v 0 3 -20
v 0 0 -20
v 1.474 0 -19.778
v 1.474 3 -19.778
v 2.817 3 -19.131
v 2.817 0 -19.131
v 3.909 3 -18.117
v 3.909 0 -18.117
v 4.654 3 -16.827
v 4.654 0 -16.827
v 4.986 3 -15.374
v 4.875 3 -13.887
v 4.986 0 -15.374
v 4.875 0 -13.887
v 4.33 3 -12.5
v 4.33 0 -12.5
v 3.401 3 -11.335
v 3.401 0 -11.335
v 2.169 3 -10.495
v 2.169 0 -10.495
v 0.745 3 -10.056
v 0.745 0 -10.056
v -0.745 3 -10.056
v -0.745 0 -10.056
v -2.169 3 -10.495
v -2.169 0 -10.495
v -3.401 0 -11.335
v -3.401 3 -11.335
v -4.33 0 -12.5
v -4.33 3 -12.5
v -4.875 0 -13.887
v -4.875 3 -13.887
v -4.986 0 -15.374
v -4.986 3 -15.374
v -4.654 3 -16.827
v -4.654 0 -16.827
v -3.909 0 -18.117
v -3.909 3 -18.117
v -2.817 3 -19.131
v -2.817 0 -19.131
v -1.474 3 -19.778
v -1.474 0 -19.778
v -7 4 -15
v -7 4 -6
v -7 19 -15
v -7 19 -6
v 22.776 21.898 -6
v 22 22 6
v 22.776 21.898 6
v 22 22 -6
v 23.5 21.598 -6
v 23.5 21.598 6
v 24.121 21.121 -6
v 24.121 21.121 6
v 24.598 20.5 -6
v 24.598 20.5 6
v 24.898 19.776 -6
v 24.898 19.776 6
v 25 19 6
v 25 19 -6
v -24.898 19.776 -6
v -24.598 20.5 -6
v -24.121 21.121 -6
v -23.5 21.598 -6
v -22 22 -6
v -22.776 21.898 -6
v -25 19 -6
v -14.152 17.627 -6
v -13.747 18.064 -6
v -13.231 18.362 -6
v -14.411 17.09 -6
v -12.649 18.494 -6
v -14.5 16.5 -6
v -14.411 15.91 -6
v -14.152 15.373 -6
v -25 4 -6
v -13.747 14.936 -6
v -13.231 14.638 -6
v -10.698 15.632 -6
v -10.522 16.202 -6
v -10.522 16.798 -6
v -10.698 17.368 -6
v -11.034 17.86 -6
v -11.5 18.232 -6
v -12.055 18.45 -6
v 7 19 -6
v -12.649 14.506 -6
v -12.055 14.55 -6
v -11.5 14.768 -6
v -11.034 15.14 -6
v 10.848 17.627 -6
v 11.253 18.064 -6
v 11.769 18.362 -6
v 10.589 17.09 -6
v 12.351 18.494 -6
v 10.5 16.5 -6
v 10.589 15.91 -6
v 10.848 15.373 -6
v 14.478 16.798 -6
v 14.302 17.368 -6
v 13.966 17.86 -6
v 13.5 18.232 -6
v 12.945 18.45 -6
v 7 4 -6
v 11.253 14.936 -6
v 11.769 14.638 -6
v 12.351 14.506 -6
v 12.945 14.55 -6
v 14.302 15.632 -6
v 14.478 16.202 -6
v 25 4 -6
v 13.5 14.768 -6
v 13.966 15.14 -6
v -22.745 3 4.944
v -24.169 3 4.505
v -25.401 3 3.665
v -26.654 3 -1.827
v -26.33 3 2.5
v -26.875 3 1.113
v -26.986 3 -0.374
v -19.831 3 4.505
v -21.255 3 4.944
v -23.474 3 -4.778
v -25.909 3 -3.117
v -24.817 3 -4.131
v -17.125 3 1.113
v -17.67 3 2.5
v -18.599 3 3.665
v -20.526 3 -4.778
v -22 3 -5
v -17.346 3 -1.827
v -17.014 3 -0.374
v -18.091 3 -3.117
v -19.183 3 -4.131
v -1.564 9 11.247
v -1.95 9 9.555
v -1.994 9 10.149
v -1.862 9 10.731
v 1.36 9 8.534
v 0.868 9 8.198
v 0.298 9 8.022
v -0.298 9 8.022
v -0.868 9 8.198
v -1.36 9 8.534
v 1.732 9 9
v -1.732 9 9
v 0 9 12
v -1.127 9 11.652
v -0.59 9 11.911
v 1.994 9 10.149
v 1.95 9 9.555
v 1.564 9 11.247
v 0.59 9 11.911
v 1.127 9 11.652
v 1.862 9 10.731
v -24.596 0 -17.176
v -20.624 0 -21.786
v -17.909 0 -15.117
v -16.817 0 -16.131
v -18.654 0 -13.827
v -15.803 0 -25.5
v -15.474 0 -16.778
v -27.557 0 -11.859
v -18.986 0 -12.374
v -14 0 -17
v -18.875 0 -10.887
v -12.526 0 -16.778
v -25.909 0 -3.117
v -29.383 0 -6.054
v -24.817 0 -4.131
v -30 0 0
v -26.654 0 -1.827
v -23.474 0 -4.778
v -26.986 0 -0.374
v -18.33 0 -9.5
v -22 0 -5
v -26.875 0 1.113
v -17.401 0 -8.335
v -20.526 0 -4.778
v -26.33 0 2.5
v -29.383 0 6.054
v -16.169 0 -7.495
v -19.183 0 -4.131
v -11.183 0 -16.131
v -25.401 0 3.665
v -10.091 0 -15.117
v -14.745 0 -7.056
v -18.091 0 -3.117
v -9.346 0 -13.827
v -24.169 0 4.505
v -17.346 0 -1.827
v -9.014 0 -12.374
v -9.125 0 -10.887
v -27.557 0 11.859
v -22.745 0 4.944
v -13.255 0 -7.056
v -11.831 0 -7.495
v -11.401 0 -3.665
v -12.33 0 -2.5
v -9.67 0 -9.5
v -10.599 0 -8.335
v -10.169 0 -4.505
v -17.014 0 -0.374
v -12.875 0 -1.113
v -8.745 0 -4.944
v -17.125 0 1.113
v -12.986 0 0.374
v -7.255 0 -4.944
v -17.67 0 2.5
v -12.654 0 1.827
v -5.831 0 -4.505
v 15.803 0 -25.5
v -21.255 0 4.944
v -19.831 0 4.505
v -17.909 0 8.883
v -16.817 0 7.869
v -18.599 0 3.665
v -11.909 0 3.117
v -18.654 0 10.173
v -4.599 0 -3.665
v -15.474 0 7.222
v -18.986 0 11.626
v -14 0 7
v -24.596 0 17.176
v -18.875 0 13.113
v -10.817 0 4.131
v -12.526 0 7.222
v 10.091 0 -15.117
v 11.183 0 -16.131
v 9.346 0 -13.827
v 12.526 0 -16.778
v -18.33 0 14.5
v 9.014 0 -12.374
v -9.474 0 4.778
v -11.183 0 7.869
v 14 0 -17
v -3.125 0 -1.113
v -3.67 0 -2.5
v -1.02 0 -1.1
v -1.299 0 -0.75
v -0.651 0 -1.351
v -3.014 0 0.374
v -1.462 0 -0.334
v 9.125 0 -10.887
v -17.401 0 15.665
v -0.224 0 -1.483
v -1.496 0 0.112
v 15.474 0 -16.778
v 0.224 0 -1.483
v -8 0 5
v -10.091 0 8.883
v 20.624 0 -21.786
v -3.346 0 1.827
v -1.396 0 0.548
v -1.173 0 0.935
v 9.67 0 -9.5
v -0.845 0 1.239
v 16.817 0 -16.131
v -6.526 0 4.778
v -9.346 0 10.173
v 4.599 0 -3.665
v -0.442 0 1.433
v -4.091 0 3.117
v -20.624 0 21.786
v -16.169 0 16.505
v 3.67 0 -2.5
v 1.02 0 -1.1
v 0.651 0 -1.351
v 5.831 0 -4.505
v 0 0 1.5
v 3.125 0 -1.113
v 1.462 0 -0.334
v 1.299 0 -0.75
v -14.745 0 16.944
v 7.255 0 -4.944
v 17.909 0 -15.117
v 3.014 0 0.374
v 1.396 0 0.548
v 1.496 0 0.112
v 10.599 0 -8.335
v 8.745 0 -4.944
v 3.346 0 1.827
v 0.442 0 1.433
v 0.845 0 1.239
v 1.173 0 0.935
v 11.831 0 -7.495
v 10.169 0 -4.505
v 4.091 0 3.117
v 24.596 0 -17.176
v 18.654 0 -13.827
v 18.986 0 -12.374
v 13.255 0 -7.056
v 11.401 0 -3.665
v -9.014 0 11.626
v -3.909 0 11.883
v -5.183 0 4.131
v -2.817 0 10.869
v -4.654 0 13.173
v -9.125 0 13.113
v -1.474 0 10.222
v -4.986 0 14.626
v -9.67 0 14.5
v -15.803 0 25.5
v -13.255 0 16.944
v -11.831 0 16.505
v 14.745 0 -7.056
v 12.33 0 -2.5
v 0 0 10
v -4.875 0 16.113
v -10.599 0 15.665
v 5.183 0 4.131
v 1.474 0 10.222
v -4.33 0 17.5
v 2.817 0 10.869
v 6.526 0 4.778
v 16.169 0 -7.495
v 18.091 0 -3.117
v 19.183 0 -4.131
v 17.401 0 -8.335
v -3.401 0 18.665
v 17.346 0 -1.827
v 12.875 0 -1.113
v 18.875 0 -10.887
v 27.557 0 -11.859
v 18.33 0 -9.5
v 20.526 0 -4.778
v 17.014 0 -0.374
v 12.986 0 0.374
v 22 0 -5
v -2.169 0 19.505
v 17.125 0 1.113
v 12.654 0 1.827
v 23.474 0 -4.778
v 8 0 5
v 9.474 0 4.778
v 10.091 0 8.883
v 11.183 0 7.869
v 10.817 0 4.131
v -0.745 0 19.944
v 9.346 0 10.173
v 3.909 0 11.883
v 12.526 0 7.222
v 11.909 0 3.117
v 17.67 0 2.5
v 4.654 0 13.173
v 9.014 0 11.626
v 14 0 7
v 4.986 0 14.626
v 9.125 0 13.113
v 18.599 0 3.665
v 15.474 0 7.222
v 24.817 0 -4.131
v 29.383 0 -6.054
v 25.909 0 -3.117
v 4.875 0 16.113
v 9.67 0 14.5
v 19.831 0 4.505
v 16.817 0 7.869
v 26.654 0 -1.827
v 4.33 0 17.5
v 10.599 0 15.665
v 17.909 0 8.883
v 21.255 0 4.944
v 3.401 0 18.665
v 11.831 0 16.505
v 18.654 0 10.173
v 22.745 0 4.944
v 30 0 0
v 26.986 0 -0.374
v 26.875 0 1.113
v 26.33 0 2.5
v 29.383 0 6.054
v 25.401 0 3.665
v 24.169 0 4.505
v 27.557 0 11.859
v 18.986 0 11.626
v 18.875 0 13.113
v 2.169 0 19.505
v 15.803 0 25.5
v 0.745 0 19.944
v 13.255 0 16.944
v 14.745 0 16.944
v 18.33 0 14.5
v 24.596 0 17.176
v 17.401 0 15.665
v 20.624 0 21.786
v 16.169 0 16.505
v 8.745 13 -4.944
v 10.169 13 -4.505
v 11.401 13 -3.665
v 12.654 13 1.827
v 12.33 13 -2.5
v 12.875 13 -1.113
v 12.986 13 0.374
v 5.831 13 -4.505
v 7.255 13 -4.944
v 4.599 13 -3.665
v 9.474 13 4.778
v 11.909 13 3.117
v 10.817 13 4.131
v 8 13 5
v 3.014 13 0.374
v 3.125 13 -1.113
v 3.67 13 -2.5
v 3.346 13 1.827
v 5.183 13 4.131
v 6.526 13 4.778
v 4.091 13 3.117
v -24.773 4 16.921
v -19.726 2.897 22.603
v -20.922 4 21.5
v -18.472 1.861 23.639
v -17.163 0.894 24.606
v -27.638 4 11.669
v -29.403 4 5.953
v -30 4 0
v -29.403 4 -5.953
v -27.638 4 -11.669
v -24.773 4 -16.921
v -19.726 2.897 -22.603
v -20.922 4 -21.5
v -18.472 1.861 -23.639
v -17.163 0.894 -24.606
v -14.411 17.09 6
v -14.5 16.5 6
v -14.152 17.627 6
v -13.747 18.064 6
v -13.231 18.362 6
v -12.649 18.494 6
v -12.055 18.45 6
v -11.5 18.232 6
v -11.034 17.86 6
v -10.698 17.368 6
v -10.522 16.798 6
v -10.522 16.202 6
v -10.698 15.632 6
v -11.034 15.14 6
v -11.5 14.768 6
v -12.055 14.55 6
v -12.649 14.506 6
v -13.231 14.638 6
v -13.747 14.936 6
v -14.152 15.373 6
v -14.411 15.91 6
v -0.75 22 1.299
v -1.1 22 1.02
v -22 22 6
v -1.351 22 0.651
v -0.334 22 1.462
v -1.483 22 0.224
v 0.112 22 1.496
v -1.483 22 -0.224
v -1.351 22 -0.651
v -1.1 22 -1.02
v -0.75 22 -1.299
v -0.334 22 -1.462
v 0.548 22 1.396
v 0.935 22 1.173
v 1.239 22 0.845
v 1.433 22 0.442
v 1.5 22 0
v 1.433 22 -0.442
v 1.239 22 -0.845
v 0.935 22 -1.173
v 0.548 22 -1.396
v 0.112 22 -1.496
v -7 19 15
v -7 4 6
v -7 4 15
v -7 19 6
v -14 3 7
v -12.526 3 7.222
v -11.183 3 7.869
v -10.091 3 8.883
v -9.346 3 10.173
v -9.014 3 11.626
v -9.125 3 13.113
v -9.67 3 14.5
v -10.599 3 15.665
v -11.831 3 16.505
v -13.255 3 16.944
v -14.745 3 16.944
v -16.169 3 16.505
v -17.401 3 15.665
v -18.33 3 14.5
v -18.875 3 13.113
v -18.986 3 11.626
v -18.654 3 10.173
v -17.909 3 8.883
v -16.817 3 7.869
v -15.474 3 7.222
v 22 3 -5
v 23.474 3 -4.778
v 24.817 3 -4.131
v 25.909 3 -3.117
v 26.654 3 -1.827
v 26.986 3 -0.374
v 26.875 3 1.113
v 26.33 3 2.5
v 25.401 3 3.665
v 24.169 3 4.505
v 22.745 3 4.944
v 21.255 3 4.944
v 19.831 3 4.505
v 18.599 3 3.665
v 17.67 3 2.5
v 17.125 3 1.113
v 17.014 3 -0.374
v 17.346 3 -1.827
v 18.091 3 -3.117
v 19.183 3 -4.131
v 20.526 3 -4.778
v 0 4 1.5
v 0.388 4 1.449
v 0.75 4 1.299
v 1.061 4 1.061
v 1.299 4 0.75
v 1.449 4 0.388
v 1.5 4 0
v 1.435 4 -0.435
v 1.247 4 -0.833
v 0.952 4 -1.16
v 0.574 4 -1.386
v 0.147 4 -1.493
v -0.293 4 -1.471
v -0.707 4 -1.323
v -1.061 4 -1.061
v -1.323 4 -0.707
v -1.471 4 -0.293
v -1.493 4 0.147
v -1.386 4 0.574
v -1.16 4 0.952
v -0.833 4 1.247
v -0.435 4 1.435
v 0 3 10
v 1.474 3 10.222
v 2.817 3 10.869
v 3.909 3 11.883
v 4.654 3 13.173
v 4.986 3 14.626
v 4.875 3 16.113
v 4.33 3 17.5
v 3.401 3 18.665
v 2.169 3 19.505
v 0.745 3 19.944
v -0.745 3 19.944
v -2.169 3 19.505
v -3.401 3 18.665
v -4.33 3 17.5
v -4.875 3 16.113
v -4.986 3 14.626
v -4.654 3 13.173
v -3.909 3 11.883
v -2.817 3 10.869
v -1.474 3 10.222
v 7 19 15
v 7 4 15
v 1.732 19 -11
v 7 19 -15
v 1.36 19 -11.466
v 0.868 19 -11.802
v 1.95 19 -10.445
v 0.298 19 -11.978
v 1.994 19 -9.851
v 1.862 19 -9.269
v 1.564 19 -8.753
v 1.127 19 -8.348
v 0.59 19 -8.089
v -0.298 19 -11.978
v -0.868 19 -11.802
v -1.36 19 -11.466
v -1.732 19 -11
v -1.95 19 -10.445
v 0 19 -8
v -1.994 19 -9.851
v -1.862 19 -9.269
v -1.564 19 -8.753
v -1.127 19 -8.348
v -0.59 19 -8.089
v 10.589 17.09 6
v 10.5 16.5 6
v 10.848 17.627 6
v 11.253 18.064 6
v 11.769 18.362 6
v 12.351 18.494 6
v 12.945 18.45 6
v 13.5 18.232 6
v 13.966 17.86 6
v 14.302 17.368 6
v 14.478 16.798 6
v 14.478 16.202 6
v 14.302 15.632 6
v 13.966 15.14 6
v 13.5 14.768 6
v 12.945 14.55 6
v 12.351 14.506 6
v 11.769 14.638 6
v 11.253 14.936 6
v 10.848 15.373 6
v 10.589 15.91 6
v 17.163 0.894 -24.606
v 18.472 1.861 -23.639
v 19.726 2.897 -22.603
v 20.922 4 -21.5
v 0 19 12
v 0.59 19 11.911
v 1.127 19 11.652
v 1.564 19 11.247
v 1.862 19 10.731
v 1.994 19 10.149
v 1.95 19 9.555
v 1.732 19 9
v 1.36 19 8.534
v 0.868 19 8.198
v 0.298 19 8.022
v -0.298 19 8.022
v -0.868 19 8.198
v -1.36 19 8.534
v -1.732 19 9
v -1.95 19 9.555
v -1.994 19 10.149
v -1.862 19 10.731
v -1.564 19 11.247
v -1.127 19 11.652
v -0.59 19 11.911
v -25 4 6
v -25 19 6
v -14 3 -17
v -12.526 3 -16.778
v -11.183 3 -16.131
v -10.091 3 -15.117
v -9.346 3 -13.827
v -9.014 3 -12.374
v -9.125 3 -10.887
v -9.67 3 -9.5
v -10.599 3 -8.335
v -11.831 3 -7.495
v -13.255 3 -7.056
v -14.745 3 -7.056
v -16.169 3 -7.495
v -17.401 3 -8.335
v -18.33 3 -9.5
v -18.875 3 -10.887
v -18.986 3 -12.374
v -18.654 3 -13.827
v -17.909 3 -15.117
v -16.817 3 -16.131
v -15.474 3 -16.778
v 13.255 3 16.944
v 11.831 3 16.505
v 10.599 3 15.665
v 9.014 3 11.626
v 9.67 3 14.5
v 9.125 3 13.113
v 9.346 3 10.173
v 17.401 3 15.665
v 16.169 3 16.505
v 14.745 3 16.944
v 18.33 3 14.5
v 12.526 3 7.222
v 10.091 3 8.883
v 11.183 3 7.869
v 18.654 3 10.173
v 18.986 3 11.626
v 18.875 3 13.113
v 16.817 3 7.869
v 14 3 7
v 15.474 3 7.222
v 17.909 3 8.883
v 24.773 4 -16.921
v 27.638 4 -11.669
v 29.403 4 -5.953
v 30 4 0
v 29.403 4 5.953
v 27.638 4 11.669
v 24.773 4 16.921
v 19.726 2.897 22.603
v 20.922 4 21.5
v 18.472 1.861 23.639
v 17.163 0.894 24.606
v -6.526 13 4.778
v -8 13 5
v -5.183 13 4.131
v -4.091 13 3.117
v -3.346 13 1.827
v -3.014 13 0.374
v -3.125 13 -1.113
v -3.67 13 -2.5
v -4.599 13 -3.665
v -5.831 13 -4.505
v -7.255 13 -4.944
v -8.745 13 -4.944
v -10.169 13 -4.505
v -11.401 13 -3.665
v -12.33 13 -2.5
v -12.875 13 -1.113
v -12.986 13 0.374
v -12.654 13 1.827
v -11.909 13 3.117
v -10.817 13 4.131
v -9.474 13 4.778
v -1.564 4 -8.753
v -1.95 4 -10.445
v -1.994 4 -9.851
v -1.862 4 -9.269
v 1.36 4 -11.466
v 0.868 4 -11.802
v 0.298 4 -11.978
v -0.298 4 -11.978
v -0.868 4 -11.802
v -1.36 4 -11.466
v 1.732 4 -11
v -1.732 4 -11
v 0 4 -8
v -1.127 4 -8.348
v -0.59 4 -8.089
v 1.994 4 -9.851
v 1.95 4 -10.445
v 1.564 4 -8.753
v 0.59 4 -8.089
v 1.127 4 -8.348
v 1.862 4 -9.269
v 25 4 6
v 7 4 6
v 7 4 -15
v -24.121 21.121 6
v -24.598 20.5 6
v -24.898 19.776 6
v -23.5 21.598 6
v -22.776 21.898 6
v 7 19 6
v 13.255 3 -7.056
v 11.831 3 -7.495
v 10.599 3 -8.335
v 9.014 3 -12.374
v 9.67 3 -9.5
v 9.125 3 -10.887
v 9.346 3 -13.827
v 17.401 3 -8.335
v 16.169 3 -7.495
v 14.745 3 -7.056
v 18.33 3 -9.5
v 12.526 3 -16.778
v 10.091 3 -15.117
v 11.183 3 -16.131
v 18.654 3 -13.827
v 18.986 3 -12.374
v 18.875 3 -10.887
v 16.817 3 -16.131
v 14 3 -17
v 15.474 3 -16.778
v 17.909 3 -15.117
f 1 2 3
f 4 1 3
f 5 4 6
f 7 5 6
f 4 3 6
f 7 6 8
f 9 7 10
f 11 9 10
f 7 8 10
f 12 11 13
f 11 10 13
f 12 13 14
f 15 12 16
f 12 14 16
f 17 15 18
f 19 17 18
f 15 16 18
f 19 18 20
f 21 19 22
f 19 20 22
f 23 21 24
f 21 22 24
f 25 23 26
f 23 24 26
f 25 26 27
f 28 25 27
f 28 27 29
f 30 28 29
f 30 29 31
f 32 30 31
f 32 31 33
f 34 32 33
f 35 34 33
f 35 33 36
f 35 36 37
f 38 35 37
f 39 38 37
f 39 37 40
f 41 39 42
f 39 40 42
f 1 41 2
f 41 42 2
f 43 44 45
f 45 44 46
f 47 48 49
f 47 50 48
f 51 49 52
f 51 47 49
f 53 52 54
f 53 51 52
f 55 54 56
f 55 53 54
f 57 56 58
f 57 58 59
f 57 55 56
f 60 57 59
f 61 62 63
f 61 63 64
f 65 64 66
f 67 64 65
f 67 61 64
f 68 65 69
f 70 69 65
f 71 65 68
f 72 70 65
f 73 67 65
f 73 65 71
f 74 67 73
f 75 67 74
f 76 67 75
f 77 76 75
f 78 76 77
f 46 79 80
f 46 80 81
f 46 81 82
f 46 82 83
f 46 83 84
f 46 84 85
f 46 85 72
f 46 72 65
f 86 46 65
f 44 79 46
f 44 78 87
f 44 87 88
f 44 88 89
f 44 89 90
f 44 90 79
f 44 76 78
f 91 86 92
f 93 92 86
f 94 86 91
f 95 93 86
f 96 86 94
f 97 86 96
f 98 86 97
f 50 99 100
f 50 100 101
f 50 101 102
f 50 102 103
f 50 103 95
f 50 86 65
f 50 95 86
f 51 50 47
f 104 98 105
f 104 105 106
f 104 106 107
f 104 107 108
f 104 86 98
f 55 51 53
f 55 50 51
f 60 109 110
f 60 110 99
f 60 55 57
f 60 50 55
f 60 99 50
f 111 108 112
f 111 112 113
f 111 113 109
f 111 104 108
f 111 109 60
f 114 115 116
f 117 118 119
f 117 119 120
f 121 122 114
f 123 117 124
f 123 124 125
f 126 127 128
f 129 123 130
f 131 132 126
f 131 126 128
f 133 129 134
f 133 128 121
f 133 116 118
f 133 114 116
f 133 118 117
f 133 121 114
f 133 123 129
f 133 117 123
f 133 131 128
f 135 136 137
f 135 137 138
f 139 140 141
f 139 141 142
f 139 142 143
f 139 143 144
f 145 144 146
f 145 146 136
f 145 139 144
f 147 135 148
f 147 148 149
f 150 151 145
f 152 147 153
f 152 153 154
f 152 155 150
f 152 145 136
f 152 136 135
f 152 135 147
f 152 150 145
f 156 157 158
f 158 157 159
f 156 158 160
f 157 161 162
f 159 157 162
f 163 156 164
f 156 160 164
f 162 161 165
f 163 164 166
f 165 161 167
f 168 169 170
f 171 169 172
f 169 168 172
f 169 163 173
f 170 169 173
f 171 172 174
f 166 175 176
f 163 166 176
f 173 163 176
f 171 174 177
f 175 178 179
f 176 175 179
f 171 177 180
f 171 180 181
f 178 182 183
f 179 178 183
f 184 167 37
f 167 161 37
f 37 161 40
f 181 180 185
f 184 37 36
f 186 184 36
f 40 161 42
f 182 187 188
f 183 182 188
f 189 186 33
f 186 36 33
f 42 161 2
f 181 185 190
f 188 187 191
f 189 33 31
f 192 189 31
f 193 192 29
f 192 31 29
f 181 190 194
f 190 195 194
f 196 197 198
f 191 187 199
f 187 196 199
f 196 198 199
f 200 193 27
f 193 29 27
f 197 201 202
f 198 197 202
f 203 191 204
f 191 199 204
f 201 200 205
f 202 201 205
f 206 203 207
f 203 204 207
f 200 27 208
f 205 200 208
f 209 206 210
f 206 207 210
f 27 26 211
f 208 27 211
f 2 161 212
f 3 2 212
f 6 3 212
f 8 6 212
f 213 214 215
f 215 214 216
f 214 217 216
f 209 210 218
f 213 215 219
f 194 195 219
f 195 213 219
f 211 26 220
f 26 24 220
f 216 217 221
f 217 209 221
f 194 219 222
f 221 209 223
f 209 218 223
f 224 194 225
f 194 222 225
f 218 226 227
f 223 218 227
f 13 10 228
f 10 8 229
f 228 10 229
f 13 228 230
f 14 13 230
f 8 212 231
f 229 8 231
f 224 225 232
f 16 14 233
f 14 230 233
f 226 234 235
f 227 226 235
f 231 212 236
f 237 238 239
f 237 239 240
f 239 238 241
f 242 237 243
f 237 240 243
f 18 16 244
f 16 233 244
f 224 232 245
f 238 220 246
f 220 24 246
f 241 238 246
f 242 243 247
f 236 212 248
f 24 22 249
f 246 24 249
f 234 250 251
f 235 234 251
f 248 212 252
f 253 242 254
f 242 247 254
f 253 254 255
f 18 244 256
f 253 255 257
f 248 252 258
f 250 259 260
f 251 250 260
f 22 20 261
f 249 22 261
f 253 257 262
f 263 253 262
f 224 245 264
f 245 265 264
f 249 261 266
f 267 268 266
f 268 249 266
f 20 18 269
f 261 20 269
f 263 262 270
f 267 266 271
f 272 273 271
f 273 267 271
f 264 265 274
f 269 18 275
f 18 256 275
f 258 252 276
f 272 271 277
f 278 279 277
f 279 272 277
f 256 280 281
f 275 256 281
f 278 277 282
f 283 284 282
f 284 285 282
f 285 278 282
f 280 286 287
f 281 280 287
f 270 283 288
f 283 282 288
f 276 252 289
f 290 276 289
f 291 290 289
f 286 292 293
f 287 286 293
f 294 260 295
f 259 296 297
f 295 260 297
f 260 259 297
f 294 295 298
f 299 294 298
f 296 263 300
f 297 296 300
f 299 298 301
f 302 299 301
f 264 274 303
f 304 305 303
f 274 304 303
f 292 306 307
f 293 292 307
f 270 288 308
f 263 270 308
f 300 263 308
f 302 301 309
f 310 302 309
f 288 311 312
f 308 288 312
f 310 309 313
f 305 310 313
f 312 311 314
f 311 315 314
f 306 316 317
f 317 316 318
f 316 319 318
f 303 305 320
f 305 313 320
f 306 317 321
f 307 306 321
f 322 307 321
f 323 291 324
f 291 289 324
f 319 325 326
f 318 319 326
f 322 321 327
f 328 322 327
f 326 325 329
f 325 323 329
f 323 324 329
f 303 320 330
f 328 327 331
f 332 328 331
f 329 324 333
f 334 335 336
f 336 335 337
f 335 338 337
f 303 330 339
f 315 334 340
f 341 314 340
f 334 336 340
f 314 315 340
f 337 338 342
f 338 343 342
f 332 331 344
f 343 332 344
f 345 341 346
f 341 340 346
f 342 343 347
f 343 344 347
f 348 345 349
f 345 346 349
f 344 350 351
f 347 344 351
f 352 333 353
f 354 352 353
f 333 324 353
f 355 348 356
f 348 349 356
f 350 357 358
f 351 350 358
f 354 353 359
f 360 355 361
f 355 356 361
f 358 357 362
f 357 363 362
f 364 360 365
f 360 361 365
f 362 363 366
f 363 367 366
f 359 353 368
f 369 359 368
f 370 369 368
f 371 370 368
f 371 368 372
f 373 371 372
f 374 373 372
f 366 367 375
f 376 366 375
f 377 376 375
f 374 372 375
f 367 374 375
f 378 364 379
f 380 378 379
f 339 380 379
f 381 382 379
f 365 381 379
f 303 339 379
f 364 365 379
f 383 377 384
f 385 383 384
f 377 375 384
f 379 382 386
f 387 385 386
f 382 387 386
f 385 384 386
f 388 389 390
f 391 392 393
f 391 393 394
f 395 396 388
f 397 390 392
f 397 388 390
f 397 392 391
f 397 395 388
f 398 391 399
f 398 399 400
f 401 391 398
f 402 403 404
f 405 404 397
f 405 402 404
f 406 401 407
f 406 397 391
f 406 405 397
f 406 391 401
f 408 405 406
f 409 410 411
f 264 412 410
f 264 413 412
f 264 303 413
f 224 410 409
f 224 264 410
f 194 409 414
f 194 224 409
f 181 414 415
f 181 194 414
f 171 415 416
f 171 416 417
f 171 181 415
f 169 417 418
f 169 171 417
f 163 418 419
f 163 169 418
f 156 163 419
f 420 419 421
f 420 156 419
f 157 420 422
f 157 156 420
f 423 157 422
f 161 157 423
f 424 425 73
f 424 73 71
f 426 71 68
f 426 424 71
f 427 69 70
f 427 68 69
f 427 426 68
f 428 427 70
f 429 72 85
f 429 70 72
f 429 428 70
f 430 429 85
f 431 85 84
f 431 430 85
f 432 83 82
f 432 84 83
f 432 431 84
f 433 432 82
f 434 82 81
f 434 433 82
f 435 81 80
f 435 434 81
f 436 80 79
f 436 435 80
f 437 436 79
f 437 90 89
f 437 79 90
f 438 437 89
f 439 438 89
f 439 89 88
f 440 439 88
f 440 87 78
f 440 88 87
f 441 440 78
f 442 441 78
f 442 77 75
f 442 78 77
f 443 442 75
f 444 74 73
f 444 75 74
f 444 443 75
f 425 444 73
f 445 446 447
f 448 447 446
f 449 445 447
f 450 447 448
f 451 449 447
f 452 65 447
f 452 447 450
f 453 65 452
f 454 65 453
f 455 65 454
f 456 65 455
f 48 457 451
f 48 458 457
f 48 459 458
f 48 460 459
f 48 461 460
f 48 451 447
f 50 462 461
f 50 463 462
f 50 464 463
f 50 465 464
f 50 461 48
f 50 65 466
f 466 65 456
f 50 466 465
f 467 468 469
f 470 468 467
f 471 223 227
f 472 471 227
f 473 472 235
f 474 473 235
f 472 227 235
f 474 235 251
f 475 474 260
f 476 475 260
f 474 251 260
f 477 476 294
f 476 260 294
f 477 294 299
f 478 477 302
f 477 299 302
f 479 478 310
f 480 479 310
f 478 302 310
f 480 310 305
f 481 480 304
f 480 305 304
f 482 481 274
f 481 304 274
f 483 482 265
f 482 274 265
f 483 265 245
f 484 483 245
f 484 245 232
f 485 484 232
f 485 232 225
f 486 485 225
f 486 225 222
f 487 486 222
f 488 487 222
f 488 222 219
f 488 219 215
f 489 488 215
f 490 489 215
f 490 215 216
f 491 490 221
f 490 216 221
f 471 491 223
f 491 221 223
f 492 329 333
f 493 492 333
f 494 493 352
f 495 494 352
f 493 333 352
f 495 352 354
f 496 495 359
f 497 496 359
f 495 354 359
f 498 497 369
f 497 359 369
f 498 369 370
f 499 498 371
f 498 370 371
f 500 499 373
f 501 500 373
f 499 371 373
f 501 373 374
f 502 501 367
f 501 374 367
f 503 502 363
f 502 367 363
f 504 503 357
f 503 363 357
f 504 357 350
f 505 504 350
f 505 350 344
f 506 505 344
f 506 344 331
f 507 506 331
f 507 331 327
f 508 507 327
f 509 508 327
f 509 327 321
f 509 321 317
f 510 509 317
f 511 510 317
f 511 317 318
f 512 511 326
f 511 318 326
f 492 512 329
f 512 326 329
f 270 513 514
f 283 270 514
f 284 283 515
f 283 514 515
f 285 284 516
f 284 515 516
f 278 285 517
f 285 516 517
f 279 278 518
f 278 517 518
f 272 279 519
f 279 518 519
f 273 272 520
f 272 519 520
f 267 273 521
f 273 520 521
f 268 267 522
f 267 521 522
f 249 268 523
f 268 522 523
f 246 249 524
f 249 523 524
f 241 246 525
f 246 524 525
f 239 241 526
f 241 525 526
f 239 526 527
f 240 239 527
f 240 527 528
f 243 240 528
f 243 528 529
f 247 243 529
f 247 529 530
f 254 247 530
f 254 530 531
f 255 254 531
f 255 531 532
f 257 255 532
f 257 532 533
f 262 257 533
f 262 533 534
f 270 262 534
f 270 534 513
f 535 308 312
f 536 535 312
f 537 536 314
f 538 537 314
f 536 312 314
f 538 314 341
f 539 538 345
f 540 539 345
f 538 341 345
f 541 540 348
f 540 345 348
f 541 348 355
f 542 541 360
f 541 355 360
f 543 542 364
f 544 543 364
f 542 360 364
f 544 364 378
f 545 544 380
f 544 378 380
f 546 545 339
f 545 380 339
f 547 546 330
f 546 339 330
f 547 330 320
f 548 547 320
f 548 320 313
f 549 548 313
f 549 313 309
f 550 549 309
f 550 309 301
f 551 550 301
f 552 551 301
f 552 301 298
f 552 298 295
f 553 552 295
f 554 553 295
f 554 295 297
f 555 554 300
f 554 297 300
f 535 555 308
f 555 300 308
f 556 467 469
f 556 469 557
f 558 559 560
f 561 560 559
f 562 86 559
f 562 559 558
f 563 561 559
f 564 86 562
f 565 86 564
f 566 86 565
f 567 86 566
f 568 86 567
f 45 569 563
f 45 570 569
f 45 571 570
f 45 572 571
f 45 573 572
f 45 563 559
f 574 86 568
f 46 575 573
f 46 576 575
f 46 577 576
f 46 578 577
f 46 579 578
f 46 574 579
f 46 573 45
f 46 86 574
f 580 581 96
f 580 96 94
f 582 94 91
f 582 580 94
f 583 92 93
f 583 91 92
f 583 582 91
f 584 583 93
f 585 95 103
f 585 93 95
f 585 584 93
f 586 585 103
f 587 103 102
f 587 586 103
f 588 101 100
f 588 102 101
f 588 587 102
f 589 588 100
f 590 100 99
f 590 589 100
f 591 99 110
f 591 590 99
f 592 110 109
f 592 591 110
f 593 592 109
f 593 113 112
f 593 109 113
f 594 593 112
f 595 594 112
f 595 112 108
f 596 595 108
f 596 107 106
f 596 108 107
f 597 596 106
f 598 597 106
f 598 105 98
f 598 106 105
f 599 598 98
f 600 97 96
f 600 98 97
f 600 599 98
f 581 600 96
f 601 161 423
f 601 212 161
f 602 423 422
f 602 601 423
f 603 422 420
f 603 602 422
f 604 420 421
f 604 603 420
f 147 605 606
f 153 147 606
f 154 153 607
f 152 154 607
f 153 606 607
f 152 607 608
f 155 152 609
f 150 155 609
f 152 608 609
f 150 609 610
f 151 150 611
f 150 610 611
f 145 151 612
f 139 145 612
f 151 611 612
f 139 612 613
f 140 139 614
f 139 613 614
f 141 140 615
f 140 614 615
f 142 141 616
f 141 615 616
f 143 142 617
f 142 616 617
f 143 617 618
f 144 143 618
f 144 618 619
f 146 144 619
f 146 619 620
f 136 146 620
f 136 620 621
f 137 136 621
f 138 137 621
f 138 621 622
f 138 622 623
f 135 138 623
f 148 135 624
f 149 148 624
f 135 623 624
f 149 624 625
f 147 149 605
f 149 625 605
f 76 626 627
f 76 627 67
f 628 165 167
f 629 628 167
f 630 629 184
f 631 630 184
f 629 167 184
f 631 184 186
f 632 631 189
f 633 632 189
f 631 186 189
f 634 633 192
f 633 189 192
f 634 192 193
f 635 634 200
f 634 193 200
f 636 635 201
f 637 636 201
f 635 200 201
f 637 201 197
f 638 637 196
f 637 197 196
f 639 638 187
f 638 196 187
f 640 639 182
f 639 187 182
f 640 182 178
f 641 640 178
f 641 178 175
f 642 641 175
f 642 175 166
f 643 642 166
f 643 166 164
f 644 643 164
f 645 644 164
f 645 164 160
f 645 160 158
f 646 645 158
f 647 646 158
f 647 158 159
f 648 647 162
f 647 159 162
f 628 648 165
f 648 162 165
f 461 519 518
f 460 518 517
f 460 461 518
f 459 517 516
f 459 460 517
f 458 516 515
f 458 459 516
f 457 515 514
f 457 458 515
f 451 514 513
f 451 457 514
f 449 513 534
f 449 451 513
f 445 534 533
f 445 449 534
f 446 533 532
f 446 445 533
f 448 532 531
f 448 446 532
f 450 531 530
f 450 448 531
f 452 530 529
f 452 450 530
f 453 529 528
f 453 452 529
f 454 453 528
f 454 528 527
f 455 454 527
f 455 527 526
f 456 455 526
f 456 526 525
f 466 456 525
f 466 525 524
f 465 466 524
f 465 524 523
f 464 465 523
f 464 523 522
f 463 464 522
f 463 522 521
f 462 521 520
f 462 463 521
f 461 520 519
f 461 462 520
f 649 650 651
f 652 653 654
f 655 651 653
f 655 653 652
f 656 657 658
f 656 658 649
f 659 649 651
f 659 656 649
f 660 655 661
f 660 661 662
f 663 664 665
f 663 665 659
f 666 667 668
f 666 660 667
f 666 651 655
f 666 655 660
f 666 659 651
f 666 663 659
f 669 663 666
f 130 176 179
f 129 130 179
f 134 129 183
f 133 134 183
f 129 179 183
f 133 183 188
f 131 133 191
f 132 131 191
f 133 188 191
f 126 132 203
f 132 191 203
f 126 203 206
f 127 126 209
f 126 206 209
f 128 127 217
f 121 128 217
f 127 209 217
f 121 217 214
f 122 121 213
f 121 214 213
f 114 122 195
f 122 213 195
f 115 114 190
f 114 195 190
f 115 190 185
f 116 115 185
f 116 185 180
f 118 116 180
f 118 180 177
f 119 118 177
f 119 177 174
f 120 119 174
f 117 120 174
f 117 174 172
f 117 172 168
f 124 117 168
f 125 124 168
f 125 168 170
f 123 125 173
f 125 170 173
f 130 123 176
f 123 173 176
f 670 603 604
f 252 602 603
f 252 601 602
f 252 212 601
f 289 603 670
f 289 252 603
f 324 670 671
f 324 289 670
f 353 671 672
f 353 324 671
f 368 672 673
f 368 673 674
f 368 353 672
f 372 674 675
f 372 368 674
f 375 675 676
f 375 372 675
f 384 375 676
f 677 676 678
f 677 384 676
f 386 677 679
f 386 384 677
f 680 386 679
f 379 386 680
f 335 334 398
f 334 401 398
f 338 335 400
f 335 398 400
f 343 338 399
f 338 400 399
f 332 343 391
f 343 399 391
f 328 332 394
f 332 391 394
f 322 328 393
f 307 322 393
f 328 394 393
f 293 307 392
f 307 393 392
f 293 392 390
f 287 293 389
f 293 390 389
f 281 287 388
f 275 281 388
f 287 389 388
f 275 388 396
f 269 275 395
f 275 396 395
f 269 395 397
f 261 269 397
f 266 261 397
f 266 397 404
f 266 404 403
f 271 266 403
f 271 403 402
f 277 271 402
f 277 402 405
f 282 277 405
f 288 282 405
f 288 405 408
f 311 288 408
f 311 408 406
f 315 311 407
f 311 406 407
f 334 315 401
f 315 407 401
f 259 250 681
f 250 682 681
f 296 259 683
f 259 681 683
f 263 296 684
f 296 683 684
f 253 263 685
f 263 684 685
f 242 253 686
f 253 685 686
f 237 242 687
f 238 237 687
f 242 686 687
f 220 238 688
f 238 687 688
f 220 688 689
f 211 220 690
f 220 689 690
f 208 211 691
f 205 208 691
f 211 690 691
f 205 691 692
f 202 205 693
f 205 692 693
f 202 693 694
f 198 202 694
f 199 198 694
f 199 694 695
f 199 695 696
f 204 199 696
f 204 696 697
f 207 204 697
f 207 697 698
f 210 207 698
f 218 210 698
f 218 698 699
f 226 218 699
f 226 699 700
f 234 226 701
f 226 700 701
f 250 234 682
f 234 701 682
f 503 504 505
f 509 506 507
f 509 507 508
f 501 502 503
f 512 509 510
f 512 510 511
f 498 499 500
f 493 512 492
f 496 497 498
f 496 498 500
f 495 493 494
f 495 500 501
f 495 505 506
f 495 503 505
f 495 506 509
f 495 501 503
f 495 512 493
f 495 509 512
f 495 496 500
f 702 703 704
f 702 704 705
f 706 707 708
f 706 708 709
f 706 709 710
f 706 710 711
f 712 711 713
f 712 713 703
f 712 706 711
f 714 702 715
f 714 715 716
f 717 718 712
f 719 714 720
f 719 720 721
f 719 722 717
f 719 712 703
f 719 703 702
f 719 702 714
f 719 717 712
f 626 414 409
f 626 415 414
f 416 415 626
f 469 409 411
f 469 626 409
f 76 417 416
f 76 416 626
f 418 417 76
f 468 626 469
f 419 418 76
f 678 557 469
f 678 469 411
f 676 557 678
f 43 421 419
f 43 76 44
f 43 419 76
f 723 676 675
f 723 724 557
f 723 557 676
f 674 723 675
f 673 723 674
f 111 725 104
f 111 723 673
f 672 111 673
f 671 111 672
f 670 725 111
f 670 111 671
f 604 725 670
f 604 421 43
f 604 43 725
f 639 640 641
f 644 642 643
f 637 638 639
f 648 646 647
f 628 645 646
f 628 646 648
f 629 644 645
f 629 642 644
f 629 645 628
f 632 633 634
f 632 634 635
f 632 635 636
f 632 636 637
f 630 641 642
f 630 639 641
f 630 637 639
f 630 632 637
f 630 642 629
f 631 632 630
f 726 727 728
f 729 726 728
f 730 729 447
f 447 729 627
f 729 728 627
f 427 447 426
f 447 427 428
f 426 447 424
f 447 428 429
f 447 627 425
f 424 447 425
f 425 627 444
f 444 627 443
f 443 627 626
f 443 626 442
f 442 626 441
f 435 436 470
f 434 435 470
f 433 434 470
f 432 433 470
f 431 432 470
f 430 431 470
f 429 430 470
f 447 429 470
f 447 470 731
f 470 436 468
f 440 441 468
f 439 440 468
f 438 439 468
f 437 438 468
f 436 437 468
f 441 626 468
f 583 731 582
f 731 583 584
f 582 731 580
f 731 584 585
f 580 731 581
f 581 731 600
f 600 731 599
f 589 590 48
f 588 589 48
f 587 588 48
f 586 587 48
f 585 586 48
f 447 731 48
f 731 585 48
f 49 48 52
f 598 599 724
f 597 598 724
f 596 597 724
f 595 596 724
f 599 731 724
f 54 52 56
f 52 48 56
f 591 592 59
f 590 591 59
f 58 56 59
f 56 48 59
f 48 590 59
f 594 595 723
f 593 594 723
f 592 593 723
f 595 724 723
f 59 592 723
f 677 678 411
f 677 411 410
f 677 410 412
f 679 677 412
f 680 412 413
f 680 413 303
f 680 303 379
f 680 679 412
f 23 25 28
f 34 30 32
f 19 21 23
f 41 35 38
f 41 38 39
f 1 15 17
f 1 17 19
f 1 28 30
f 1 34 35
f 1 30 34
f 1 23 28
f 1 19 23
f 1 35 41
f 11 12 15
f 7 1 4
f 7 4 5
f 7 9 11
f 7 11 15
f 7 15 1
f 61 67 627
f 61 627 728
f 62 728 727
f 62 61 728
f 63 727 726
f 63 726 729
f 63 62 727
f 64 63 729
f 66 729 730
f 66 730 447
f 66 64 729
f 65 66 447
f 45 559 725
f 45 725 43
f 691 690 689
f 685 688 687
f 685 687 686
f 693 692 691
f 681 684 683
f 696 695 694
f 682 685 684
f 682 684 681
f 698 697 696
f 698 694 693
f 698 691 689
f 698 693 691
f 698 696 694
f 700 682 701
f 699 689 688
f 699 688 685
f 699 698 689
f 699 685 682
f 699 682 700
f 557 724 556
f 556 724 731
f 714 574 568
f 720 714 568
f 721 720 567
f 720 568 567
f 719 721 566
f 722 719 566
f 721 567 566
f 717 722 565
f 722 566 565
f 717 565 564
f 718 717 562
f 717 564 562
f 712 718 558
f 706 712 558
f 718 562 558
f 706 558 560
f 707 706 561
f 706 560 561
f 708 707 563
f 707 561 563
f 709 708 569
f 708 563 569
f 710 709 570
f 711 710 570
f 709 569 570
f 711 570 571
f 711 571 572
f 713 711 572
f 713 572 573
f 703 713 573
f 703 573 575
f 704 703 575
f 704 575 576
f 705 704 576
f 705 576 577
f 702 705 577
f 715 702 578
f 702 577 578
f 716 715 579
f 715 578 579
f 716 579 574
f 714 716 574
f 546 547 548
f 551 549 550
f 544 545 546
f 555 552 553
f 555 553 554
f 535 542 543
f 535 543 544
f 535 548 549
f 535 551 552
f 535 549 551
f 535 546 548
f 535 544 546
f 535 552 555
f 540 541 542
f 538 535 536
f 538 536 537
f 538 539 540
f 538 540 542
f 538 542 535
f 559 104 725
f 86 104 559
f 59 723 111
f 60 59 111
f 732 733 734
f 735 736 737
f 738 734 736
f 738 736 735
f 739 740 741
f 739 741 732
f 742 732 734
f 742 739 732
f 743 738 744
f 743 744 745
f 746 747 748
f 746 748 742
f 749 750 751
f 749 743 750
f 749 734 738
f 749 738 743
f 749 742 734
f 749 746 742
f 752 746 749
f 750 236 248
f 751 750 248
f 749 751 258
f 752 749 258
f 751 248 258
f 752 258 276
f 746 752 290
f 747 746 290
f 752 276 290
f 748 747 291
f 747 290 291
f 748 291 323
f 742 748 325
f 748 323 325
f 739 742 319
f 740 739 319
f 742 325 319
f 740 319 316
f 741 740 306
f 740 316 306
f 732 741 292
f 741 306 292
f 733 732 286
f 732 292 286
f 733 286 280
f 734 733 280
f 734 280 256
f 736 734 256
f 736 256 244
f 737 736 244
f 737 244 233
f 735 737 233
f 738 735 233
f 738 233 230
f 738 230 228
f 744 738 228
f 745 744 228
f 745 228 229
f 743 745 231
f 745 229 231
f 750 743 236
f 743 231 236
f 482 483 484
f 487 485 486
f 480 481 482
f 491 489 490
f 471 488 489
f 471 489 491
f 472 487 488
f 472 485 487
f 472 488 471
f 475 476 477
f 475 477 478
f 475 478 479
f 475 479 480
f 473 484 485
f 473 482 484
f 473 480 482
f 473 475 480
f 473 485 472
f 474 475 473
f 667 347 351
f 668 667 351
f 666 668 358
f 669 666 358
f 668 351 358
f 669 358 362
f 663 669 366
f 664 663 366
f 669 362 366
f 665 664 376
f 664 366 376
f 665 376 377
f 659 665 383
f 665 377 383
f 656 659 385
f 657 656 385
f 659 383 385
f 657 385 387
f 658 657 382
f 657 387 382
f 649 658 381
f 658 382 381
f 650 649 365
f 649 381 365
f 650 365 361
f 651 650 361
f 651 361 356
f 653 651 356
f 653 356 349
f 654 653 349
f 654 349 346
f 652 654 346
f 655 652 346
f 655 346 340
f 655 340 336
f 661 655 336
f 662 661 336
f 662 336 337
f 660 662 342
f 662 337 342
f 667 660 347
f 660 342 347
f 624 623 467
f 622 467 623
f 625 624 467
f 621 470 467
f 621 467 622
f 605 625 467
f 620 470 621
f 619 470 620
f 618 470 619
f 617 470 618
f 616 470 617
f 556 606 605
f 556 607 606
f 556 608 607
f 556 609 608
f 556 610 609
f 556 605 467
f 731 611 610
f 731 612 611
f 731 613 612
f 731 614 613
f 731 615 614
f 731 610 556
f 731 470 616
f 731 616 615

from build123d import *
from build123d.topology import SkipClean

# Parameters (mm, degrees)
SKETCH1_R                            = 30
BOSS_EXTRUDE1_DEPTH                  = 4
BOSS_EXTRUDE2_REACH                  = 44.615
BOSS_EXTRUDE2_END_RADIUS             = 30
BOSS_EXTRUDE2_DIRECTION_2_REACH      = 44.615
BOSS_EXTRUDE2_DIRECTION_2_END_RADIUS = 30
SKETCH3_OUTSIDE_W                    = 78.092
SKETCH3_OUTSIDE_H                    = 69.092
SKETCH3_OUTSIDE_R                    = 21.5
CUT_EXTRUDE2_DEPTH                   = 12.5
BOSS_EXTRUDE3_DEPTH                  = 18
BOSS_EXTRUDE4_DEPTH                  = 15
BOSS_EXTRUDE5_DEPTH                  = 15
CUT_EXTRUDE3_DEPTH                   = 44.292609069
CUT_EXTRUDE3_DEPTH_BACK              = 44.292609069
SKETCH8_R                            = 2
CUT_EXTRUDE8_DEPTH                   = 48.077064479
CUT_EXTRUDE8_DEPTH_BACK              = 48.077064479
CUT_EXTRUDE9_DEPTH                   = 59.659818207
CUT_EXTRUDE11_DEPTH                  = 20
CUT_EXTRUDE12_DEPTH                  = 20
CUT_EXTRUDE13_DEPTH                  = 20
CUT_EXTRUDE14_DEPTH                  = 44.292609069
CUT_EXTRUDE14_DEPTH_BACK             = 44.292609069
SKETCH25_W                           = 66.075437062
SKETCH25_H                           = 20.142243048
SKETCH26_R                           = 5
CUT_EXTRUDE15_DEPTH                  = 24
SKETCH27_R                           = 1.5
CUT_EXTRUDE16_DEPTH                  = 30
SKETCH28_R                           = 5
CUT_EXTRUDE17_DEPTH                  = 3
CUT_EXTRUDE18_DEPTH                  = 43.690748412
CUT_EXTRUDE18_DEPTH_BACK             = 43.690748412
SKETCH29_W                           = 43.412566799
SKETCH29_H                           = 13.326200919
SKETCH32_W                           = 50
SKETCH32_H                           = 12
BOSS_EXTRUDE6_DEPTH                  = 18
SKETCH35_W                           = 14
SKETCH35_H                           = 15
BOSS_EXTRUDE7_DEPTH                  = 9
CUT_EXTRUDE19_DEPTH                  = 49.746794766
CUT_EXTRUDE19_DEPTH_BACK             = 49.746794766
SKETCH37_R                           = 2
SKETCH36_R                           = 2
CUT_EXTRUDE20_DEPTH                  = 15
SKETCH39_W                           = 14
SKETCH39_H                           = 15
BOSS_EXTRUDE8_DEPTH                  = 9
SKETCH40_R                           = 2
CUT_EXTRUDE21_DEPTH                  = 10
CUT_EXTRUDE22_START                  = -9
SKETCH41_R                           = 5
CUT_EXTRUDE22_DEPTH                  = 9
CUT_EXTRUDE23_START                  = -9
SKETCH42_R                           = 5
CUT_EXTRUDE23_DEPTH                  = 9
FILLET1_R                            = 3
CUT_EXTRUDE24_START                  = -19
CUT_EXTRUDE24_OUTLINE_R              = 1.5
CUT_EXTRUDE24_DEPTH                  = 19
CUT_EXTRUDE24_START_2                = -7
CUT_EXTRUDE24_2_DEPTH                = 14


with BuildPart() as part:
    # Sketch1 → Boss-Extrude1 (new body)
    with BuildSketch(Plane(origin=(0, 0, 0), x_dir=(1, 0, 0), z_dir=(0, 1, 0))):
        with Locations(Location((0, 0, 0), (0, 0, 270))):
            Circle(SKETCH1_R)
    extrude(amount=BOSS_EXTRUDE1_DEPTH)

    # Boss-Extrude2: up to this cylinder (the profile starts inside it)
    with SkipClean():  # the faces are left unmerged after this step: merging them gives an invalid solid
        boss_extrude2_end = Plane(origin=(0, 9.396175, 0), z_dir=(0, -1, 0)) * Cylinder(BOSS_EXTRUDE2_END_RADIUS, 150.23, mode=Mode.PRIVATE)
        # Sketch2 → Boss-Extrude2 (add, up to the surface)
        with BuildSketch(Plane(origin=(0, 0, 0), x_dir=(0, 0, -1), z_dir=(1, 0, 0)), mode=Mode.PRIVATE) as boss_extrude2_sk1:
            Polygon((0, 4), (21.5, 4), (9, 16.5), (-9, 16.5), (-21.5, 4), align=None)
        boss_extrude2_tool1 = extrude(boss_extrude2_sk1.sketch, amount=BOSS_EXTRUDE2_REACH, mode=Mode.PRIVATE) & boss_extrude2_end
        add(boss_extrude2_tool1.solids().sort_by_distance((0, 9.396175, 0))[0])

    # Boss-Extrude2 direction 2: up to this cylinder (the profile starts inside it)
    with SkipClean():  # the faces are left unmerged after this step: merging them gives an invalid solid
        boss_extrude2_direction_2_end = Plane(origin=(0, 9.396175, 0), z_dir=(0, -1, 0)) * Cylinder(BOSS_EXTRUDE2_DIRECTION_2_END_RADIUS, 150.23, mode=Mode.PRIVATE)
        # Sketch2 → Boss-Extrude2 direction 2 (add, up to the surface)
        with BuildSketch(Plane(origin=(0, 0, 0), x_dir=(0, 0, -1), z_dir=(1, 0, 0)), mode=Mode.PRIVATE) as boss_extrude2_direction_2_sk1:
            Polygon((0, 4), (21.5, 4), (9, 16.5), (-9, 16.5), (-21.5, 4), align=None)
        boss_extrude2_direction_2_tool1 = extrude(boss_extrude2_direction_2_sk1.sketch, amount=-BOSS_EXTRUDE2_DIRECTION_2_REACH, mode=Mode.PRIVATE) & boss_extrude2_direction_2_end
        add(boss_extrude2_direction_2_tool1.solids().sort_by_distance((0, 9.396175, 0))[0])

    # SurfaceCut1
    split(bisect_by=Plane(origin=(0, 12.75, -12.75), x_dir=(1, 0, 0), z_dir=(0, 0.7071067811865558, -0.7071067811865392)), keep=Keep.BOTTOM)

    # SurfaceCut2
    split(bisect_by=Plane(origin=(0, 12.75, 12.75), x_dir=(1, 0, 0), z_dir=(0, 0.7071067811865509, 0.7071067811865442)), keep=Keep.BOTTOM)

    # Sketch3 outside → Cut-Extrude2 (cut)
    with BuildSketch(Plane(origin=(0, 4, 0), x_dir=(1, 0, 0), z_dir=(0, 1, 0))):
        Rectangle(SKETCH3_OUTSIDE_W, SKETCH3_OUTSIDE_H)
        Circle(SKETCH3_OUTSIDE_R, mode=Mode.SUBTRACT)
    extrude(amount=CUT_EXTRUDE2_DEPTH, mode=Mode.SUBTRACT)

    # Sketch5 → Boss-Extrude3 (add)
    with BuildSketch(Plane(origin=(0, 0, 0), x_dir=(-1, 0, 0), z_dir=(0, -1, 0))):
        Polygon((0, -6), (-17.5, -6), (-17.5, 6), (17.5, 6), (17.5, -6), align=None)
    extrude(amount=BOSS_EXTRUDE3_DEPTH)

    # Sketch6 → Boss-Extrude4 (add)
    with BuildSketch(Plane.XZ):
        Polygon((0, 15), (7, 15), (7, 6), (-7, 6), (-7, 15), align=None)
    extrude(amount=BOSS_EXTRUDE4_DEPTH)

    # Sketch7 → Boss-Extrude5 (add)
    with BuildSketch(Plane.XZ):
        Polygon((0, -15), (7, -15), (7, -6), (-7, -6), (-7, -15), align=None)
    extrude(amount=BOSS_EXTRUDE5_DEPTH)

    # Sketch8 → Cut-Extrude3 (cut, two sides: drawn at the far end of the back side and taken through both)
    with BuildSketch(Plane.XY.offset(-CUT_EXTRUDE3_DEPTH_BACK)):
        with Locations((-12.5, -12.5)):
            Circle(SKETCH8_R)
        with Locations((12.5, -12.5)):
            Circle(SKETCH8_R)
    extrude(amount=CUT_EXTRUDE3_DEPTH + CUT_EXTRUDE3_DEPTH_BACK, mode=Mode.SUBTRACT)

    # Sketch16 → Cut-Extrude8 (cut, two sides: drawn at the far end of the back side and taken through both)
    with BuildSketch(Plane.XY.offset(6).offset(-CUT_EXTRUDE8_DEPTH_BACK)):
        Polygon((17.5, -18), (17.5, -14.5), (14, -18), align=None)
        Polygon((-17.5, -18), (-14, -18), (-17.5, -14.5), align=None)
    extrude(amount=CUT_EXTRUDE8_DEPTH + CUT_EXTRUDE8_DEPTH_BACK, mode=Mode.SUBTRACT)

    # Sketch17 → Cut-Extrude9 (cut, through all)
    with BuildSketch(Plane(origin=(10.365975269, -9.674910251, -8.062425209), x_dir=(-0.3613483622370374, 0.337258471421235, -0.8693009171531012), z_dir=(0.6355070151731325, -0.5931398808282571, -0.49428323402354774))):
        Polygon((-2.372510104, -6.189601271), (7.980636686, -0.706686759), (7.980636686, -10.965829024), align=None)
    extrude(amount=CUT_EXTRUDE9_DEPTH, mode=Mode.SUBTRACT)

    # Sketch19 → Cut-Extrude11 (cut)
    with BuildSketch(Plane(origin=(-10.365975269, -9.674910251, -8.062425209), x_dir=(0.3613483622370374, 0.33725847142123494, -0.8693009171531012), z_dir=(0.6355070151731324, 0.5931398808282571, 0.4942832340235476))):
        Polygon((-2.372510104, -6.189601271), (7.980636686, -10.965829024), (7.980636686, -0.706686759), align=None)
    extrude(amount=-CUT_EXTRUDE11_DEPTH, mode=Mode.SUBTRACT)

    # Sketch20 → Cut-Extrude12 (cut)
    with BuildSketch(Plane(origin=(-10.365975269, -9.674910251, 8.062425209), x_dir=(-0.3613483622370374, -0.3372584714212349, -0.8693009171531013), z_dir=(0.6355070151731326, 0.593139880828257, -0.49428323402354757))):
        Polygon((2.372510104, -6.189601271), (-7.980636686, -0.706686759), (-7.980636686, -10.965829024), align=None)
    extrude(amount=-CUT_EXTRUDE12_DEPTH, mode=Mode.SUBTRACT)

    # Sketch21 → Cut-Extrude13 (cut)
    with BuildSketch(Plane(origin=(10.365975269, -9.674910251, 8.062425209), x_dir=(-0.3613483622370374, 0.3372584714212349, 0.8693009171531013), z_dir=(-0.6355070151731326, 0.593139880828257, -0.49428323402354757))):
        Polygon((-2.372510104, -6.189601271), (7.980636686, -0.706686759), (7.980636686, -10.965829024), align=None)
    extrude(amount=-CUT_EXTRUDE13_DEPTH, mode=Mode.SUBTRACT)

    # Sketch25 → Cut-Extrude14 (cut, two sides: drawn at the far end of the back side and taken through both)
    with BuildSketch(Plane.XY.offset(-CUT_EXTRUDE14_DEPTH_BACK)):
        with Locations((0, -10.071121524)):
            Rectangle(SKETCH25_W, SKETCH25_H)
    extrude(amount=CUT_EXTRUDE14_DEPTH + CUT_EXTRUDE14_DEPTH_BACK, mode=Mode.SUBTRACT)

    # Sketch26 → Cut-Extrude15 (cut)
    with BuildSketch(Plane(origin=(0, 16.5, 0), x_dir=(1, 0, 0), z_dir=(0, 1, 0))):
        with Locations(Location((-8, 0, 0), (0, 0, 270))):
            Circle(SKETCH26_R)
        with Locations(Location((8, 0, 0), (0, 0, 270))):
            Circle(SKETCH26_R)
    extrude(amount=-CUT_EXTRUDE15_DEPTH, mode=Mode.SUBTRACT)

    # Sketch27 → Cut-Extrude16 (cut)
    with BuildSketch(Plane(origin=(0, 16.5, 0), x_dir=(1, 0, 0), z_dir=(0, 1, 0))):
        with Locations(Location((0, 0, 0), (0, 0, 270))):
            Circle(SKETCH27_R)
    extrude(amount=-CUT_EXTRUDE16_DEPTH, mode=Mode.SUBTRACT)

    # Sketch28 → Cut-Extrude17 (cut)
    with BuildSketch(Plane.XZ):
        with Locations(Location((0, -15, 0), (0, 0, 270))):
            Circle(SKETCH28_R)
        with Locations(Location((22, 0, 0), (0, 0, 270))):
            Circle(SKETCH28_R)
        with Locations(Location((0, 15, 0), (0, 0, 270))):
            Circle(SKETCH28_R)
        with Locations(Location((-22, 0, 0), (0, 0, 270))):
            Circle(SKETCH28_R)
        with Locations(Location((-14, 12, 0), (0, 0, 270))):
            Circle(SKETCH28_R)
        with Locations(Location((14, 12, 0), (0, 0, 270))):
            Circle(SKETCH28_R)
        with Locations(Location((14, -12, 0), (0, 0, 270))):
            Circle(SKETCH28_R)
        with Locations(Location((-14, -12, 0), (0, 0, 270))):
            Circle(SKETCH28_R)
    extrude(amount=-CUT_EXTRUDE17_DEPTH, mode=Mode.SUBTRACT)

    # Sketch29 → Cut-Extrude18 (cut, two sides: drawn at the far end of the back side and taken through both)
    with BuildSketch(Plane(origin=(0, 0, 0), x_dir=(0, 0, -1), z_dir=(1, 0, 0)).offset(-CUT_EXTRUDE18_DEPTH_BACK)):
        with Locations((0.2062834, 10.66310046)):
            Rectangle(SKETCH29_W, SKETCH29_H)
    extrude(amount=CUT_EXTRUDE18_DEPTH + CUT_EXTRUDE18_DEPTH_BACK, mode=Mode.SUBTRACT)

    # Sketch32 → Boss-Extrude6 (add)
    with BuildSketch(Plane(origin=(0, 4, 0), x_dir=(1, 0, 0), z_dir=(0, 1, 0))):
        Rectangle(SKETCH32_W, SKETCH32_H)
    extrude(amount=BOSS_EXTRUDE6_DEPTH)

    # Sketch35 → Boss-Extrude7 (add)
    with BuildSketch(Plane(origin=(0, 0, -6), x_dir=(-1, 0, 0), z_dir=(0, 0, -1))):
        with Locations((0, 11.5)):
            Rectangle(SKETCH35_W, SKETCH35_H)
    extrude(amount=BOSS_EXTRUDE7_DEPTH)

    # Sketch37 → Cut-Extrude19 (cut, two sides: drawn at the far end of the back side and taken through both)
    with BuildSketch(Plane(origin=(0, 0, -6), x_dir=(-1, 0, 0), z_dir=(0, 0, -1)).offset(-CUT_EXTRUDE19_DEPTH_BACK)):
        with Locations((-12.5, 16.5)):
            Circle(SKETCH37_R)
        with Locations((12.5, 16.5)):
            Circle(SKETCH37_R)
    extrude(amount=CUT_EXTRUDE19_DEPTH + CUT_EXTRUDE19_DEPTH_BACK, mode=Mode.SUBTRACT)

    # Sketch36 → Cut-Extrude20 (cut)
    with BuildSketch(Plane(origin=(0, 19, 0), x_dir=(1, 0, 0), z_dir=(0, 1, 0))):
        with Locations(Location((0, 10, 0), (0, 0, 270))):
            Circle(SKETCH36_R)
    extrude(amount=-CUT_EXTRUDE20_DEPTH, mode=Mode.SUBTRACT)

    # Sketch39 → Boss-Extrude8 (add)
    with BuildSketch(Plane.XY.offset(6)):
        with Locations((0, 11.5)):
            Rectangle(SKETCH39_W, SKETCH39_H)
    extrude(amount=BOSS_EXTRUDE8_DEPTH)

    # Sketch40 → Cut-Extrude21 (cut)
    with BuildSketch(Plane(origin=(0, 19, 0), x_dir=(1, 0, 0), z_dir=(0, 1, 0))):
        with Locations(Location((0, -10, 0), (0, 0, 270))):
            Circle(SKETCH40_R)
    extrude(amount=-CUT_EXTRUDE21_DEPTH, mode=Mode.SUBTRACT)

    # Sketch41 → Cut-Extrude22 (cut)
    with BuildSketch(Plane.XZ.offset(-4).offset(CUT_EXTRUDE22_START)):
        with Locations(Location((-8, 0, 0), (0, 0, 90))):
            Circle(SKETCH41_R)
    extrude(amount=CUT_EXTRUDE22_DEPTH, mode=Mode.SUBTRACT)

    # Sketch42 → Cut-Extrude23 (cut)
    with BuildSketch(Plane.XZ.offset(-4).offset(CUT_EXTRUDE23_START)):
        with Locations(Location((8, 0, 0), (0, 0, 90))):
            Circle(SKETCH42_R)
    extrude(amount=CUT_EXTRUDE23_DEPTH, mode=Mode.SUBTRACT)

    # Fillet1
    fillet1_edges = [part.edges().sort_by_distance(p)[0] for p in [
        (25, 22, 0),
    ]]
    fillet(fillet1_edges, radius=FILLET1_R)

    # Cut-Extrude24: read off the stored shape, not the designer's step
    # Cut-Extrude24 outline → Cut-Extrude24 (cut)
    with BuildSketch(Plane.XZ.offset(-4).offset(CUT_EXTRUDE24_START)):
        Circle(CUT_EXTRUDE24_OUTLINE_R)
    extrude(amount=CUT_EXTRUDE24_DEPTH, mode=Mode.SUBTRACT)

    # Cut-Extrude24 2 outline → Cut-Extrude24 2 (cut)
    with BuildSketch(Plane.XY.offset(CUT_EXTRUDE24_START_2)):
        with BuildLine():
            Line((-25, 22), (-25, 19))
            ThreePointArc((-25, 19), (-24.121320344, 21.121320344), (-22, 22))
            Line((-22, 22), (-25, 22))
        make_face()
    extrude(amount=CUT_EXTRUDE24_2_DEPTH, mode=Mode.SUBTRACT)


solid = part.part
